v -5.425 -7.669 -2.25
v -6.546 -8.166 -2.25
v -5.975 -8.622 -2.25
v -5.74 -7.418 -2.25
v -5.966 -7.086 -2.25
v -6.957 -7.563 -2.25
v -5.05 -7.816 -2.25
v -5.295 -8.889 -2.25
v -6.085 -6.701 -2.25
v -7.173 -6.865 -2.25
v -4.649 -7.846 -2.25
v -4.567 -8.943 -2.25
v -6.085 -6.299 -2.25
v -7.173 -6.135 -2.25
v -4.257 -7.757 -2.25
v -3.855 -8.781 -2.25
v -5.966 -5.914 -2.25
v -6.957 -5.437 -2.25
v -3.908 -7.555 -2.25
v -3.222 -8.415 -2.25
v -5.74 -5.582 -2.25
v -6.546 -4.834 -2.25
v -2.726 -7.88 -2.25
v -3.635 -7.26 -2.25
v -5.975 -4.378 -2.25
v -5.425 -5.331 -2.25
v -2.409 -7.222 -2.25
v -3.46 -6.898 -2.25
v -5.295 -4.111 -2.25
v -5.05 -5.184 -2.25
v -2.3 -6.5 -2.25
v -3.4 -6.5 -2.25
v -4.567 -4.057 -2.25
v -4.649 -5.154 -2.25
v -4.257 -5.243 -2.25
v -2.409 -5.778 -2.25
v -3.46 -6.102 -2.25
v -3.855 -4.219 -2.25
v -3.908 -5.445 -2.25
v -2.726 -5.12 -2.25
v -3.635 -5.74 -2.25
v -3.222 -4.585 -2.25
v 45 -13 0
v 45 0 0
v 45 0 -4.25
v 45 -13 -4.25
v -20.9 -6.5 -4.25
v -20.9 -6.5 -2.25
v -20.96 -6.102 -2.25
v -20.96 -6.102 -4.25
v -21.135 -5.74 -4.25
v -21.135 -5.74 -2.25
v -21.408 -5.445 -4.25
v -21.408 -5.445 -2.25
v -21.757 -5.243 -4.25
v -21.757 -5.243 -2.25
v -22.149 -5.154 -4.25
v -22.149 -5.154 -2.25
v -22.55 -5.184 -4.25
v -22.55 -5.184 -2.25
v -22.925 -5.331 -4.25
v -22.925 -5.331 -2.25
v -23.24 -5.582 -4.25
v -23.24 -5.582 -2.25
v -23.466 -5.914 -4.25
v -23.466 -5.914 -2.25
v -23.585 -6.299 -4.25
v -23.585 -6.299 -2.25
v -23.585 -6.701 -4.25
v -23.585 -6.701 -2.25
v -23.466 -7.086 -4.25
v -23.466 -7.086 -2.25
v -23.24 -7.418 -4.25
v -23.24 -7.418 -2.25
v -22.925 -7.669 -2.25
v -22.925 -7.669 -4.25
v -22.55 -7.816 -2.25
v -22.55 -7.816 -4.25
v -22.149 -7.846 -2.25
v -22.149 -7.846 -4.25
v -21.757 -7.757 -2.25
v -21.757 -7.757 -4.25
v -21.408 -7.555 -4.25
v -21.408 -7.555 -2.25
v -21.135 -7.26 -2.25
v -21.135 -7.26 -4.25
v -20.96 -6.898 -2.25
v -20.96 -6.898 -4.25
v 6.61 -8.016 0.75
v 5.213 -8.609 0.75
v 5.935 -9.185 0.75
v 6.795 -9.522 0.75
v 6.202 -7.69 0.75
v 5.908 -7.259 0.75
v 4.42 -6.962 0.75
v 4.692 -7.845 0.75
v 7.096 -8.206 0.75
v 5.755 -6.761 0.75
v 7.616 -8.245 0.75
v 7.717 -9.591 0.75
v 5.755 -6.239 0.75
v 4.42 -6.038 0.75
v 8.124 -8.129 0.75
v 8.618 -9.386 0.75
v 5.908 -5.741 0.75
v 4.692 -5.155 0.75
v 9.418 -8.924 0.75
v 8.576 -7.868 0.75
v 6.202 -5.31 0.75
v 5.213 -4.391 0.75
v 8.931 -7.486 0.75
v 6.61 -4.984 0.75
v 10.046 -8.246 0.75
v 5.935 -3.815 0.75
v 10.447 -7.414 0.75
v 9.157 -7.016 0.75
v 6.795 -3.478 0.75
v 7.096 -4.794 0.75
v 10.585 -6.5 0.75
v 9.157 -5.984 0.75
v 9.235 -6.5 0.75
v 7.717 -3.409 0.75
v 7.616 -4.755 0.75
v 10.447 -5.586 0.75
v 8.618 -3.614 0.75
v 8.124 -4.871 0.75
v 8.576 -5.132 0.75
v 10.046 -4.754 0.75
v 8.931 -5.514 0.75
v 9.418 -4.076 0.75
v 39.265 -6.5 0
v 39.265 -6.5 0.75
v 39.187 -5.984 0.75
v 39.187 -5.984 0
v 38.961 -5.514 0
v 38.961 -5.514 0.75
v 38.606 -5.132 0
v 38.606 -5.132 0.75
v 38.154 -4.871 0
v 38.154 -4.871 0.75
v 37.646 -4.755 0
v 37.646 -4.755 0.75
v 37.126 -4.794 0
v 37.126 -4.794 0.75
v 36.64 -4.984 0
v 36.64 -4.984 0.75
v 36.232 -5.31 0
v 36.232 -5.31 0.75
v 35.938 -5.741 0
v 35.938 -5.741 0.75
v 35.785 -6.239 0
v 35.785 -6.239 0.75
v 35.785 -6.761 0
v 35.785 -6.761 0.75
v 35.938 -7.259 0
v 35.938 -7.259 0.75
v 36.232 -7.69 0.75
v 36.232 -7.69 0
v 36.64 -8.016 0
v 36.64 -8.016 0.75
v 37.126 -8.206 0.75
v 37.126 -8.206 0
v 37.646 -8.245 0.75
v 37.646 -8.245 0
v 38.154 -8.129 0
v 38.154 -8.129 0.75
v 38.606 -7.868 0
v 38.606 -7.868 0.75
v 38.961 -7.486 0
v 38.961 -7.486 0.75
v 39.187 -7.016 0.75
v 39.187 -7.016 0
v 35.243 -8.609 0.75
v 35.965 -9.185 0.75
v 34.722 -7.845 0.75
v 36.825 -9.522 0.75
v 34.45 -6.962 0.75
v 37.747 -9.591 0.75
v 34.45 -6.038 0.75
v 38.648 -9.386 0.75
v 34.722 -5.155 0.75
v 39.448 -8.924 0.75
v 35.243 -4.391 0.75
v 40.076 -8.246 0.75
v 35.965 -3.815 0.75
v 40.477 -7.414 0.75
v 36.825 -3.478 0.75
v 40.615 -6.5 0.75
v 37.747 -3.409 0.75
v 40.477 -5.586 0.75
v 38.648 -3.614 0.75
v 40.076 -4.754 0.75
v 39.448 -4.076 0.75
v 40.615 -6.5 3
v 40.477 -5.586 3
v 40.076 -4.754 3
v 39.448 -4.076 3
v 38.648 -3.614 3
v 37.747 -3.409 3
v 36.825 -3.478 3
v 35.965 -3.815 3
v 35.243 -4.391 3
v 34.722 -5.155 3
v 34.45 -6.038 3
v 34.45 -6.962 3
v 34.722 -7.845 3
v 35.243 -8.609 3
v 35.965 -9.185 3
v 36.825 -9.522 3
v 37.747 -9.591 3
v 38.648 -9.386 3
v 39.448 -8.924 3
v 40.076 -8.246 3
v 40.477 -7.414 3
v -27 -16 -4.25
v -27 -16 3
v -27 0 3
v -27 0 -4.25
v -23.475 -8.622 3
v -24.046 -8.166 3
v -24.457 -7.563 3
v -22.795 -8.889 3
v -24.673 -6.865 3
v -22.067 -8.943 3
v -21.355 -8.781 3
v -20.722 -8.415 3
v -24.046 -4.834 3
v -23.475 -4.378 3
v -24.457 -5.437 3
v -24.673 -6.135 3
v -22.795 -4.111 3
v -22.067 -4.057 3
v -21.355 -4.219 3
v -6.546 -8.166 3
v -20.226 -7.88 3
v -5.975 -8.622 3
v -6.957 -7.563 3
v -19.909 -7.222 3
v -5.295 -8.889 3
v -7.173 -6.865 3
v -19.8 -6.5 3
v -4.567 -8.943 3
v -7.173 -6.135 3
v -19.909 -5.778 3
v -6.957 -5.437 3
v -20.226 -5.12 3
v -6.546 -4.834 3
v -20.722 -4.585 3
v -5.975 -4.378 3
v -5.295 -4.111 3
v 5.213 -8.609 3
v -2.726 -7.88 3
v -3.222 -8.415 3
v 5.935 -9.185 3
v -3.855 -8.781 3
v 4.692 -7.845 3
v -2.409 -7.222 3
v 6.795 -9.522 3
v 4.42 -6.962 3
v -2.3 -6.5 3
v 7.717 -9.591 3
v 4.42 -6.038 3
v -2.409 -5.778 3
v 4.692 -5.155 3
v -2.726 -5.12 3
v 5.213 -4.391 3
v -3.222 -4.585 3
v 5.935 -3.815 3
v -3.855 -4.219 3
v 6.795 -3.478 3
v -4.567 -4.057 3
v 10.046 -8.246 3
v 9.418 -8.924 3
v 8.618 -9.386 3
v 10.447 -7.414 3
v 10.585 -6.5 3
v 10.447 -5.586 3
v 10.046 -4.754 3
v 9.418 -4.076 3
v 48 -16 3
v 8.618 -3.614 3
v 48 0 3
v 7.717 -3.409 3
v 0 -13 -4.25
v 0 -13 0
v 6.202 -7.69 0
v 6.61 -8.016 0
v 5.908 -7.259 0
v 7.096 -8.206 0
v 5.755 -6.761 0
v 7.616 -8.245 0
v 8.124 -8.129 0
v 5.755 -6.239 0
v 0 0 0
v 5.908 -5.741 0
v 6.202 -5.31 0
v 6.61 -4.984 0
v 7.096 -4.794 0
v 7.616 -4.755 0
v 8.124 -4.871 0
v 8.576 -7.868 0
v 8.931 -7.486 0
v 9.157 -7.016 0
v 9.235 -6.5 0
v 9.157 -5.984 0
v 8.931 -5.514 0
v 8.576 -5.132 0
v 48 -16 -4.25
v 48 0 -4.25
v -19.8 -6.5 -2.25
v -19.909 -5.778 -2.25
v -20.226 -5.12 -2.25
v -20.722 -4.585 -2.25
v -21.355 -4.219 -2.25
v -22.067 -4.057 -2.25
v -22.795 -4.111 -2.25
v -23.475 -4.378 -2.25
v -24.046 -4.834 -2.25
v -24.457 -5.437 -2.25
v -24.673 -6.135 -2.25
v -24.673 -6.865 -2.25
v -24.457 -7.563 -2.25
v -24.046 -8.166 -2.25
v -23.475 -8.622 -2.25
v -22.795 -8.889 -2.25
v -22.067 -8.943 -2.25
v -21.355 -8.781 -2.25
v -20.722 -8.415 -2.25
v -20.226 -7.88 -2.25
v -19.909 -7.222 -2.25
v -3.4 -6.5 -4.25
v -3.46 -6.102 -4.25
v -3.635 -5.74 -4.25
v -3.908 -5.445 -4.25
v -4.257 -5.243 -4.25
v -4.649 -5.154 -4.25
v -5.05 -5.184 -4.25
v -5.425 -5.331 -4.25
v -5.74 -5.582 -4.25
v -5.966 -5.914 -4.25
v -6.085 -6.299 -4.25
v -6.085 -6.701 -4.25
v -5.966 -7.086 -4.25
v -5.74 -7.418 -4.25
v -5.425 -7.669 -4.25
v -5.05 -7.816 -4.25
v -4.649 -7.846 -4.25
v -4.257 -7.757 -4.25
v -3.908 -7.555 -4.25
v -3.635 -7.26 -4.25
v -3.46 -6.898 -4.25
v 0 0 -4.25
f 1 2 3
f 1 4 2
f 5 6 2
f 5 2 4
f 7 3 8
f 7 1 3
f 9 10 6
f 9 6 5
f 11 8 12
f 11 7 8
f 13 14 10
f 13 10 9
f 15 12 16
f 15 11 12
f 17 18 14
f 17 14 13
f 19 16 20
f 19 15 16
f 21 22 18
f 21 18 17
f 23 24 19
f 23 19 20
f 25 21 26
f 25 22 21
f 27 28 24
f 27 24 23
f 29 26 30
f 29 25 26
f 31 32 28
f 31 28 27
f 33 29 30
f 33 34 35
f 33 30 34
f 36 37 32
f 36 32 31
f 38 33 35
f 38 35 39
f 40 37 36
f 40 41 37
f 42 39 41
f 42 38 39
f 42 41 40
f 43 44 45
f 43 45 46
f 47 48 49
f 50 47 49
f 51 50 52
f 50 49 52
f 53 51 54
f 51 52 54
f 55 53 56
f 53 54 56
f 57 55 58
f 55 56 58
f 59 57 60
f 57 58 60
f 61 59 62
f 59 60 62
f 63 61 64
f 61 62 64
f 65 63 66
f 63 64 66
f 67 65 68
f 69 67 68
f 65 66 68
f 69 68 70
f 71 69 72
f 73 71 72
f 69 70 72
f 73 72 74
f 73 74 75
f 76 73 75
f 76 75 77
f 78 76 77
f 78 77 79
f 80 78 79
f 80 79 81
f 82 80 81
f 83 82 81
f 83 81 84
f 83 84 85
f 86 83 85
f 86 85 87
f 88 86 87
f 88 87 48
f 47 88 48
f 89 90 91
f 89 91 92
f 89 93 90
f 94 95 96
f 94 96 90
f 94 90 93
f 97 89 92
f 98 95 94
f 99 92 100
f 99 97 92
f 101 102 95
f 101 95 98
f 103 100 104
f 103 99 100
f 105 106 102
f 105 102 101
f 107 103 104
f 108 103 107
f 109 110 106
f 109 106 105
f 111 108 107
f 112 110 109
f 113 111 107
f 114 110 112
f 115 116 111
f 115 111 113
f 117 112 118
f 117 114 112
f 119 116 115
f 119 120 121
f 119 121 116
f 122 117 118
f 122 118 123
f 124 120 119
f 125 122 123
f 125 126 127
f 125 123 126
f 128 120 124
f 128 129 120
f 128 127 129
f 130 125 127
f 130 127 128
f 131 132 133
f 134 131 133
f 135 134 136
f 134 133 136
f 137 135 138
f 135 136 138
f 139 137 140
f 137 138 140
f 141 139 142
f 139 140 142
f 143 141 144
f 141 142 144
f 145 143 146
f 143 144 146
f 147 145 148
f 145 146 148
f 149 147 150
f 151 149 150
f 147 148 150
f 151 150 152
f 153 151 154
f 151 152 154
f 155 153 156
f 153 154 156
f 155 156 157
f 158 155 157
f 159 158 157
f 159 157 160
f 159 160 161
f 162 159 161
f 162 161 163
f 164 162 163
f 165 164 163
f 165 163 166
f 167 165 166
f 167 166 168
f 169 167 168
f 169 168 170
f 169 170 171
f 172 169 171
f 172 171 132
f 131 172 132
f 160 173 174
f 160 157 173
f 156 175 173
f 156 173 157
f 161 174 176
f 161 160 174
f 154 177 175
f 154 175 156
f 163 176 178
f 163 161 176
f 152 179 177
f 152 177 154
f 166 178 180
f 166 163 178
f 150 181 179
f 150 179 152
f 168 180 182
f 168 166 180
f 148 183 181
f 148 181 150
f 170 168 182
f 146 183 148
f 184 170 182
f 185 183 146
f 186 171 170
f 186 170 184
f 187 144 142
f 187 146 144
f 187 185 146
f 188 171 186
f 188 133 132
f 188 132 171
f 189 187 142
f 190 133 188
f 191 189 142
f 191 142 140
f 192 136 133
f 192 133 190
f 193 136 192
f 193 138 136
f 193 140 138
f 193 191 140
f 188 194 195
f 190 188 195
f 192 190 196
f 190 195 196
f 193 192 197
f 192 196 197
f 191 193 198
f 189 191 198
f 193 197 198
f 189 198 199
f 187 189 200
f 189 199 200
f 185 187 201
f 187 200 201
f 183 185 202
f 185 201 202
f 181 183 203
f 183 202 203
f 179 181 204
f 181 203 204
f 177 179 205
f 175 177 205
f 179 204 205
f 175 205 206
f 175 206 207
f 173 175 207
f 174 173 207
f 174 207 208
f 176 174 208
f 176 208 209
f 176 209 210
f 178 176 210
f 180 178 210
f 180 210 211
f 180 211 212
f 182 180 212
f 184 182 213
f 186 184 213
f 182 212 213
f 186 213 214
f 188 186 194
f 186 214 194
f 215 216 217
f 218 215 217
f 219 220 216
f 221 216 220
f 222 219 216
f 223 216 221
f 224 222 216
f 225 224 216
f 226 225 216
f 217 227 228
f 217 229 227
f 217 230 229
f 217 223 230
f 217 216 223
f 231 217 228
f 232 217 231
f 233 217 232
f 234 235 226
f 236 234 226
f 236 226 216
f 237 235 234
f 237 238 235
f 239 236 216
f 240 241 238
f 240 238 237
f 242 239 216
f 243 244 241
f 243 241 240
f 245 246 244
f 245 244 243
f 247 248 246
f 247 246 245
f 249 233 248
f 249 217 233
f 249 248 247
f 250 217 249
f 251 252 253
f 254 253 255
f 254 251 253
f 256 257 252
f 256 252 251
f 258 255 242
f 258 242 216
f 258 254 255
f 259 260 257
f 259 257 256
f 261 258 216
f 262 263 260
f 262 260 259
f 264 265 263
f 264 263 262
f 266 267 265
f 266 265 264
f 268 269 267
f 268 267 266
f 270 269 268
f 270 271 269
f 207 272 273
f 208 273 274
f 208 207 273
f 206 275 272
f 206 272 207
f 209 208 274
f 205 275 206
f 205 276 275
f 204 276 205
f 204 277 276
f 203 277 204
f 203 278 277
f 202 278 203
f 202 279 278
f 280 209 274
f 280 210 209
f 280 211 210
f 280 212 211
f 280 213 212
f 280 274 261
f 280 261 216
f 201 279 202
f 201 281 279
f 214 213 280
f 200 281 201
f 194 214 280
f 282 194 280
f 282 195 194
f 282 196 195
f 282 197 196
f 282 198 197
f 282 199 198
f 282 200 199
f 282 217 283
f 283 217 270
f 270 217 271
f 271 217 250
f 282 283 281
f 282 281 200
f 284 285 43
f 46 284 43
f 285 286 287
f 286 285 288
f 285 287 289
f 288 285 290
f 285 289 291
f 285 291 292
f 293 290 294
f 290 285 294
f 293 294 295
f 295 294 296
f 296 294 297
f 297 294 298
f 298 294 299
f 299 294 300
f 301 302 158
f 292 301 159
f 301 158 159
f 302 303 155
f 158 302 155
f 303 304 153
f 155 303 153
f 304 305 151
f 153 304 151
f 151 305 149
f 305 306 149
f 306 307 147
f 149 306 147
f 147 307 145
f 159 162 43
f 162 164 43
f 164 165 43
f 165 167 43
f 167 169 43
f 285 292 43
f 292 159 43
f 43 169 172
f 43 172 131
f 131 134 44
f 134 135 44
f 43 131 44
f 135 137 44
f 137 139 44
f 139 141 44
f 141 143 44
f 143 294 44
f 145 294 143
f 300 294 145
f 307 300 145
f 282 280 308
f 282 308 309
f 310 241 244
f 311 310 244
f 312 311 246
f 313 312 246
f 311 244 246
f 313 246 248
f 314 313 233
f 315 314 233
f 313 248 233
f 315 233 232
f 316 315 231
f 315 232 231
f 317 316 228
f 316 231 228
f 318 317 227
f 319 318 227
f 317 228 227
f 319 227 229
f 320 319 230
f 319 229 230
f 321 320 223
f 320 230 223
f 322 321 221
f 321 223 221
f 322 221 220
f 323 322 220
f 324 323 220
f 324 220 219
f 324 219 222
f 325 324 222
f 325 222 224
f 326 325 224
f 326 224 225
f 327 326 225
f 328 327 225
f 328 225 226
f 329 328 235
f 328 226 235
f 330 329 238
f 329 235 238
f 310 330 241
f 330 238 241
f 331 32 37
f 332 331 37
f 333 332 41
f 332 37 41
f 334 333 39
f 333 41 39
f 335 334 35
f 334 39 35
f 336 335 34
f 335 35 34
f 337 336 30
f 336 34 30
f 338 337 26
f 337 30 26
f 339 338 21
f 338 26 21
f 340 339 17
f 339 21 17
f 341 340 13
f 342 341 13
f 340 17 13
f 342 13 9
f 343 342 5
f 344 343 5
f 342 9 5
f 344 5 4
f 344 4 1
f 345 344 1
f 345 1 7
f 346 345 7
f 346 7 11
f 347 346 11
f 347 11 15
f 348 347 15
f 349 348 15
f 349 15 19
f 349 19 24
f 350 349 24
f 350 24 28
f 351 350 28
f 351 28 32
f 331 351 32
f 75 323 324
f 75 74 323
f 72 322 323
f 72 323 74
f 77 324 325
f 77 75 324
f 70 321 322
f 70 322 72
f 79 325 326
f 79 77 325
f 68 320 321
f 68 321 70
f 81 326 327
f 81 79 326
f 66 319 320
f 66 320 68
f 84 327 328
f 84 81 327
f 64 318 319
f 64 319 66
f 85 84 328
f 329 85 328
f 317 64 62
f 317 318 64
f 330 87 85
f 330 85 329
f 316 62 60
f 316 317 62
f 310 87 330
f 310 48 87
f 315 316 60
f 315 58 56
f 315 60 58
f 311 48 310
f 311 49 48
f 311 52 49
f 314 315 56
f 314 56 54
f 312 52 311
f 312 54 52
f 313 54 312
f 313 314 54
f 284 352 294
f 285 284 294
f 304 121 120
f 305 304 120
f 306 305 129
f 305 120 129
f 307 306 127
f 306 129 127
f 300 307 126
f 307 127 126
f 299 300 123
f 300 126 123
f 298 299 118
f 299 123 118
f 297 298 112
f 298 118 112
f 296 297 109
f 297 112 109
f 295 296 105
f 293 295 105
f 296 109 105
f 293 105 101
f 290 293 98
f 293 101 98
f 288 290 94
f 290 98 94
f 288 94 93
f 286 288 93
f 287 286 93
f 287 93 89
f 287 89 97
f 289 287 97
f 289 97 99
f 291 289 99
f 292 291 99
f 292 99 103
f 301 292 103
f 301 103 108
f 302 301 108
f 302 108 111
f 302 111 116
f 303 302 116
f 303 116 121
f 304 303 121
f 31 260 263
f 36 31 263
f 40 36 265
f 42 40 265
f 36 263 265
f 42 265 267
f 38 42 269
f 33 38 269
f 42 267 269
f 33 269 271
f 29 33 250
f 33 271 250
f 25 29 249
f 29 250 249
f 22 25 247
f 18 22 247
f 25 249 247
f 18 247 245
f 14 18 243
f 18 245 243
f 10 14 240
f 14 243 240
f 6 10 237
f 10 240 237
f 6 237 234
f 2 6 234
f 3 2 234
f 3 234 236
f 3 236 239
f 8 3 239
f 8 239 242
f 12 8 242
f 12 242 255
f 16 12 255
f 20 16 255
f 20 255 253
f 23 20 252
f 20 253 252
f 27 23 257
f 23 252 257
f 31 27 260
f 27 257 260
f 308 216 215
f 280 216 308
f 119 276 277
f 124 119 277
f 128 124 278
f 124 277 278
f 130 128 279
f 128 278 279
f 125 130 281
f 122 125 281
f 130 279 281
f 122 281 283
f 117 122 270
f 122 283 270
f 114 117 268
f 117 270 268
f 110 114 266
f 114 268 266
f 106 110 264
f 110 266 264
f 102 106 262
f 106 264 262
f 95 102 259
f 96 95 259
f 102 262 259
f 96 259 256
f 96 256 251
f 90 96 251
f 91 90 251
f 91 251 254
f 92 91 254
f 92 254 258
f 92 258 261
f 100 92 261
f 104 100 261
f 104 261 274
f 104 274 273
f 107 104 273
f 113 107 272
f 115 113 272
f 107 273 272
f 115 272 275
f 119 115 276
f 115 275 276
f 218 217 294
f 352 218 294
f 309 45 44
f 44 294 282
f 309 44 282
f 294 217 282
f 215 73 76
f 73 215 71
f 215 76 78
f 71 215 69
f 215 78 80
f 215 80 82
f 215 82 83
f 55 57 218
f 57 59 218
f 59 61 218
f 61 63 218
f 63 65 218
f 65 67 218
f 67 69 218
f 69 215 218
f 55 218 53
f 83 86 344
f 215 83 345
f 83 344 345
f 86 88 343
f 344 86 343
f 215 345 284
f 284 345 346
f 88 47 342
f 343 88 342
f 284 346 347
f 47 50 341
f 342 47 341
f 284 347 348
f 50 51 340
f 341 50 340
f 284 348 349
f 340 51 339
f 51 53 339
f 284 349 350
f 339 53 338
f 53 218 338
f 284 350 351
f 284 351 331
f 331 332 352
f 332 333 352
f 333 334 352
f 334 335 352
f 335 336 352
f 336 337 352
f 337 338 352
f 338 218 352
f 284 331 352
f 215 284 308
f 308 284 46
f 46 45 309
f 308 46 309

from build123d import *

# Parameters (mm, degrees)
F1_DEPTH = 13
F2_R     = 1.35
F2_R_2   = 1.75
F3_DEPTH = 7.25
F2_R_3   = 2.45
F4_DEPTH = 5.25
F2_R_4   = 3.1
F5_DEPTH = 2.25
F6_W     = 72
F6_H     = 3
F7_DEPTH = 7.25


with BuildPart() as f1:
    # F0 (on Front) → F1 (new body)
    with BuildSketch(Plane.XZ):
        Polygon((0, -4.25), (0, 0), (45, 0), (45, 3), (0, 3), (-27, 3), (-27, -4.25), align=None)
    extrude(amount=F1_DEPTH)

    # F2 (on face) → F3 (cut, through all)
    with BuildSketch(Plane.XY.offset(3)):
        with Locations((-4.75, -6.5)):
            Circle(F2_R)
        with Locations((-22.25, -6.5)):
            Circle(F2_R)
        with Locations((7.485, -6.5)):
            Circle(F2_R_2)
        with Locations((37.515, -6.5)):
            Circle(F2_R_2)
    extrude(amount=-F3_DEPTH, mode=Mode.SUBTRACT)

    # F2 (on face) → F4 (cut, through all)
    with BuildSketch(Plane.XY.offset(3)):
        with Locations((-4.75, -6.5)):
            Circle(F2_R_3)
        with Locations((-4.75, -6.5)):
            Circle(F2_R, mode=Mode.SUBTRACT)
        with Locations((-22.25, -6.5)):
            Circle(F2_R_3)
        with Locations((-22.25, -6.5)):
            Circle(F2_R, mode=Mode.SUBTRACT)
    extrude(amount=-F4_DEPTH, mode=Mode.SUBTRACT)

    # F2 (on face) → F5 (cut, through all)
    with BuildSketch(Plane.XY.offset(3)):
        with Locations((7.485, -6.5)):
            Circle(F2_R_4)
        with Locations((7.485, -6.5)):
            Circle(F2_R_2, mode=Mode.SUBTRACT)
        with Locations((37.515, -6.5)):
            Circle(F2_R_4)
        with Locations((37.515, -6.5)):
            Circle(F2_R_2, mode=Mode.SUBTRACT)
    extrude(amount=-F5_DEPTH, mode=Mode.SUBTRACT)

    # F6 (on face) → F7 (join, through all)
    with BuildSketch(Plane.XY.offset(3)):
        with Locations((9, -14.5)):
            Rectangle(F6_W, F6_H)
        Polygon((45, 0), (45, -13), (45, -16), (48, -16), (48, 0), align=None)
    extrude(amount=-F7_DEPTH)


solid = f1.part
